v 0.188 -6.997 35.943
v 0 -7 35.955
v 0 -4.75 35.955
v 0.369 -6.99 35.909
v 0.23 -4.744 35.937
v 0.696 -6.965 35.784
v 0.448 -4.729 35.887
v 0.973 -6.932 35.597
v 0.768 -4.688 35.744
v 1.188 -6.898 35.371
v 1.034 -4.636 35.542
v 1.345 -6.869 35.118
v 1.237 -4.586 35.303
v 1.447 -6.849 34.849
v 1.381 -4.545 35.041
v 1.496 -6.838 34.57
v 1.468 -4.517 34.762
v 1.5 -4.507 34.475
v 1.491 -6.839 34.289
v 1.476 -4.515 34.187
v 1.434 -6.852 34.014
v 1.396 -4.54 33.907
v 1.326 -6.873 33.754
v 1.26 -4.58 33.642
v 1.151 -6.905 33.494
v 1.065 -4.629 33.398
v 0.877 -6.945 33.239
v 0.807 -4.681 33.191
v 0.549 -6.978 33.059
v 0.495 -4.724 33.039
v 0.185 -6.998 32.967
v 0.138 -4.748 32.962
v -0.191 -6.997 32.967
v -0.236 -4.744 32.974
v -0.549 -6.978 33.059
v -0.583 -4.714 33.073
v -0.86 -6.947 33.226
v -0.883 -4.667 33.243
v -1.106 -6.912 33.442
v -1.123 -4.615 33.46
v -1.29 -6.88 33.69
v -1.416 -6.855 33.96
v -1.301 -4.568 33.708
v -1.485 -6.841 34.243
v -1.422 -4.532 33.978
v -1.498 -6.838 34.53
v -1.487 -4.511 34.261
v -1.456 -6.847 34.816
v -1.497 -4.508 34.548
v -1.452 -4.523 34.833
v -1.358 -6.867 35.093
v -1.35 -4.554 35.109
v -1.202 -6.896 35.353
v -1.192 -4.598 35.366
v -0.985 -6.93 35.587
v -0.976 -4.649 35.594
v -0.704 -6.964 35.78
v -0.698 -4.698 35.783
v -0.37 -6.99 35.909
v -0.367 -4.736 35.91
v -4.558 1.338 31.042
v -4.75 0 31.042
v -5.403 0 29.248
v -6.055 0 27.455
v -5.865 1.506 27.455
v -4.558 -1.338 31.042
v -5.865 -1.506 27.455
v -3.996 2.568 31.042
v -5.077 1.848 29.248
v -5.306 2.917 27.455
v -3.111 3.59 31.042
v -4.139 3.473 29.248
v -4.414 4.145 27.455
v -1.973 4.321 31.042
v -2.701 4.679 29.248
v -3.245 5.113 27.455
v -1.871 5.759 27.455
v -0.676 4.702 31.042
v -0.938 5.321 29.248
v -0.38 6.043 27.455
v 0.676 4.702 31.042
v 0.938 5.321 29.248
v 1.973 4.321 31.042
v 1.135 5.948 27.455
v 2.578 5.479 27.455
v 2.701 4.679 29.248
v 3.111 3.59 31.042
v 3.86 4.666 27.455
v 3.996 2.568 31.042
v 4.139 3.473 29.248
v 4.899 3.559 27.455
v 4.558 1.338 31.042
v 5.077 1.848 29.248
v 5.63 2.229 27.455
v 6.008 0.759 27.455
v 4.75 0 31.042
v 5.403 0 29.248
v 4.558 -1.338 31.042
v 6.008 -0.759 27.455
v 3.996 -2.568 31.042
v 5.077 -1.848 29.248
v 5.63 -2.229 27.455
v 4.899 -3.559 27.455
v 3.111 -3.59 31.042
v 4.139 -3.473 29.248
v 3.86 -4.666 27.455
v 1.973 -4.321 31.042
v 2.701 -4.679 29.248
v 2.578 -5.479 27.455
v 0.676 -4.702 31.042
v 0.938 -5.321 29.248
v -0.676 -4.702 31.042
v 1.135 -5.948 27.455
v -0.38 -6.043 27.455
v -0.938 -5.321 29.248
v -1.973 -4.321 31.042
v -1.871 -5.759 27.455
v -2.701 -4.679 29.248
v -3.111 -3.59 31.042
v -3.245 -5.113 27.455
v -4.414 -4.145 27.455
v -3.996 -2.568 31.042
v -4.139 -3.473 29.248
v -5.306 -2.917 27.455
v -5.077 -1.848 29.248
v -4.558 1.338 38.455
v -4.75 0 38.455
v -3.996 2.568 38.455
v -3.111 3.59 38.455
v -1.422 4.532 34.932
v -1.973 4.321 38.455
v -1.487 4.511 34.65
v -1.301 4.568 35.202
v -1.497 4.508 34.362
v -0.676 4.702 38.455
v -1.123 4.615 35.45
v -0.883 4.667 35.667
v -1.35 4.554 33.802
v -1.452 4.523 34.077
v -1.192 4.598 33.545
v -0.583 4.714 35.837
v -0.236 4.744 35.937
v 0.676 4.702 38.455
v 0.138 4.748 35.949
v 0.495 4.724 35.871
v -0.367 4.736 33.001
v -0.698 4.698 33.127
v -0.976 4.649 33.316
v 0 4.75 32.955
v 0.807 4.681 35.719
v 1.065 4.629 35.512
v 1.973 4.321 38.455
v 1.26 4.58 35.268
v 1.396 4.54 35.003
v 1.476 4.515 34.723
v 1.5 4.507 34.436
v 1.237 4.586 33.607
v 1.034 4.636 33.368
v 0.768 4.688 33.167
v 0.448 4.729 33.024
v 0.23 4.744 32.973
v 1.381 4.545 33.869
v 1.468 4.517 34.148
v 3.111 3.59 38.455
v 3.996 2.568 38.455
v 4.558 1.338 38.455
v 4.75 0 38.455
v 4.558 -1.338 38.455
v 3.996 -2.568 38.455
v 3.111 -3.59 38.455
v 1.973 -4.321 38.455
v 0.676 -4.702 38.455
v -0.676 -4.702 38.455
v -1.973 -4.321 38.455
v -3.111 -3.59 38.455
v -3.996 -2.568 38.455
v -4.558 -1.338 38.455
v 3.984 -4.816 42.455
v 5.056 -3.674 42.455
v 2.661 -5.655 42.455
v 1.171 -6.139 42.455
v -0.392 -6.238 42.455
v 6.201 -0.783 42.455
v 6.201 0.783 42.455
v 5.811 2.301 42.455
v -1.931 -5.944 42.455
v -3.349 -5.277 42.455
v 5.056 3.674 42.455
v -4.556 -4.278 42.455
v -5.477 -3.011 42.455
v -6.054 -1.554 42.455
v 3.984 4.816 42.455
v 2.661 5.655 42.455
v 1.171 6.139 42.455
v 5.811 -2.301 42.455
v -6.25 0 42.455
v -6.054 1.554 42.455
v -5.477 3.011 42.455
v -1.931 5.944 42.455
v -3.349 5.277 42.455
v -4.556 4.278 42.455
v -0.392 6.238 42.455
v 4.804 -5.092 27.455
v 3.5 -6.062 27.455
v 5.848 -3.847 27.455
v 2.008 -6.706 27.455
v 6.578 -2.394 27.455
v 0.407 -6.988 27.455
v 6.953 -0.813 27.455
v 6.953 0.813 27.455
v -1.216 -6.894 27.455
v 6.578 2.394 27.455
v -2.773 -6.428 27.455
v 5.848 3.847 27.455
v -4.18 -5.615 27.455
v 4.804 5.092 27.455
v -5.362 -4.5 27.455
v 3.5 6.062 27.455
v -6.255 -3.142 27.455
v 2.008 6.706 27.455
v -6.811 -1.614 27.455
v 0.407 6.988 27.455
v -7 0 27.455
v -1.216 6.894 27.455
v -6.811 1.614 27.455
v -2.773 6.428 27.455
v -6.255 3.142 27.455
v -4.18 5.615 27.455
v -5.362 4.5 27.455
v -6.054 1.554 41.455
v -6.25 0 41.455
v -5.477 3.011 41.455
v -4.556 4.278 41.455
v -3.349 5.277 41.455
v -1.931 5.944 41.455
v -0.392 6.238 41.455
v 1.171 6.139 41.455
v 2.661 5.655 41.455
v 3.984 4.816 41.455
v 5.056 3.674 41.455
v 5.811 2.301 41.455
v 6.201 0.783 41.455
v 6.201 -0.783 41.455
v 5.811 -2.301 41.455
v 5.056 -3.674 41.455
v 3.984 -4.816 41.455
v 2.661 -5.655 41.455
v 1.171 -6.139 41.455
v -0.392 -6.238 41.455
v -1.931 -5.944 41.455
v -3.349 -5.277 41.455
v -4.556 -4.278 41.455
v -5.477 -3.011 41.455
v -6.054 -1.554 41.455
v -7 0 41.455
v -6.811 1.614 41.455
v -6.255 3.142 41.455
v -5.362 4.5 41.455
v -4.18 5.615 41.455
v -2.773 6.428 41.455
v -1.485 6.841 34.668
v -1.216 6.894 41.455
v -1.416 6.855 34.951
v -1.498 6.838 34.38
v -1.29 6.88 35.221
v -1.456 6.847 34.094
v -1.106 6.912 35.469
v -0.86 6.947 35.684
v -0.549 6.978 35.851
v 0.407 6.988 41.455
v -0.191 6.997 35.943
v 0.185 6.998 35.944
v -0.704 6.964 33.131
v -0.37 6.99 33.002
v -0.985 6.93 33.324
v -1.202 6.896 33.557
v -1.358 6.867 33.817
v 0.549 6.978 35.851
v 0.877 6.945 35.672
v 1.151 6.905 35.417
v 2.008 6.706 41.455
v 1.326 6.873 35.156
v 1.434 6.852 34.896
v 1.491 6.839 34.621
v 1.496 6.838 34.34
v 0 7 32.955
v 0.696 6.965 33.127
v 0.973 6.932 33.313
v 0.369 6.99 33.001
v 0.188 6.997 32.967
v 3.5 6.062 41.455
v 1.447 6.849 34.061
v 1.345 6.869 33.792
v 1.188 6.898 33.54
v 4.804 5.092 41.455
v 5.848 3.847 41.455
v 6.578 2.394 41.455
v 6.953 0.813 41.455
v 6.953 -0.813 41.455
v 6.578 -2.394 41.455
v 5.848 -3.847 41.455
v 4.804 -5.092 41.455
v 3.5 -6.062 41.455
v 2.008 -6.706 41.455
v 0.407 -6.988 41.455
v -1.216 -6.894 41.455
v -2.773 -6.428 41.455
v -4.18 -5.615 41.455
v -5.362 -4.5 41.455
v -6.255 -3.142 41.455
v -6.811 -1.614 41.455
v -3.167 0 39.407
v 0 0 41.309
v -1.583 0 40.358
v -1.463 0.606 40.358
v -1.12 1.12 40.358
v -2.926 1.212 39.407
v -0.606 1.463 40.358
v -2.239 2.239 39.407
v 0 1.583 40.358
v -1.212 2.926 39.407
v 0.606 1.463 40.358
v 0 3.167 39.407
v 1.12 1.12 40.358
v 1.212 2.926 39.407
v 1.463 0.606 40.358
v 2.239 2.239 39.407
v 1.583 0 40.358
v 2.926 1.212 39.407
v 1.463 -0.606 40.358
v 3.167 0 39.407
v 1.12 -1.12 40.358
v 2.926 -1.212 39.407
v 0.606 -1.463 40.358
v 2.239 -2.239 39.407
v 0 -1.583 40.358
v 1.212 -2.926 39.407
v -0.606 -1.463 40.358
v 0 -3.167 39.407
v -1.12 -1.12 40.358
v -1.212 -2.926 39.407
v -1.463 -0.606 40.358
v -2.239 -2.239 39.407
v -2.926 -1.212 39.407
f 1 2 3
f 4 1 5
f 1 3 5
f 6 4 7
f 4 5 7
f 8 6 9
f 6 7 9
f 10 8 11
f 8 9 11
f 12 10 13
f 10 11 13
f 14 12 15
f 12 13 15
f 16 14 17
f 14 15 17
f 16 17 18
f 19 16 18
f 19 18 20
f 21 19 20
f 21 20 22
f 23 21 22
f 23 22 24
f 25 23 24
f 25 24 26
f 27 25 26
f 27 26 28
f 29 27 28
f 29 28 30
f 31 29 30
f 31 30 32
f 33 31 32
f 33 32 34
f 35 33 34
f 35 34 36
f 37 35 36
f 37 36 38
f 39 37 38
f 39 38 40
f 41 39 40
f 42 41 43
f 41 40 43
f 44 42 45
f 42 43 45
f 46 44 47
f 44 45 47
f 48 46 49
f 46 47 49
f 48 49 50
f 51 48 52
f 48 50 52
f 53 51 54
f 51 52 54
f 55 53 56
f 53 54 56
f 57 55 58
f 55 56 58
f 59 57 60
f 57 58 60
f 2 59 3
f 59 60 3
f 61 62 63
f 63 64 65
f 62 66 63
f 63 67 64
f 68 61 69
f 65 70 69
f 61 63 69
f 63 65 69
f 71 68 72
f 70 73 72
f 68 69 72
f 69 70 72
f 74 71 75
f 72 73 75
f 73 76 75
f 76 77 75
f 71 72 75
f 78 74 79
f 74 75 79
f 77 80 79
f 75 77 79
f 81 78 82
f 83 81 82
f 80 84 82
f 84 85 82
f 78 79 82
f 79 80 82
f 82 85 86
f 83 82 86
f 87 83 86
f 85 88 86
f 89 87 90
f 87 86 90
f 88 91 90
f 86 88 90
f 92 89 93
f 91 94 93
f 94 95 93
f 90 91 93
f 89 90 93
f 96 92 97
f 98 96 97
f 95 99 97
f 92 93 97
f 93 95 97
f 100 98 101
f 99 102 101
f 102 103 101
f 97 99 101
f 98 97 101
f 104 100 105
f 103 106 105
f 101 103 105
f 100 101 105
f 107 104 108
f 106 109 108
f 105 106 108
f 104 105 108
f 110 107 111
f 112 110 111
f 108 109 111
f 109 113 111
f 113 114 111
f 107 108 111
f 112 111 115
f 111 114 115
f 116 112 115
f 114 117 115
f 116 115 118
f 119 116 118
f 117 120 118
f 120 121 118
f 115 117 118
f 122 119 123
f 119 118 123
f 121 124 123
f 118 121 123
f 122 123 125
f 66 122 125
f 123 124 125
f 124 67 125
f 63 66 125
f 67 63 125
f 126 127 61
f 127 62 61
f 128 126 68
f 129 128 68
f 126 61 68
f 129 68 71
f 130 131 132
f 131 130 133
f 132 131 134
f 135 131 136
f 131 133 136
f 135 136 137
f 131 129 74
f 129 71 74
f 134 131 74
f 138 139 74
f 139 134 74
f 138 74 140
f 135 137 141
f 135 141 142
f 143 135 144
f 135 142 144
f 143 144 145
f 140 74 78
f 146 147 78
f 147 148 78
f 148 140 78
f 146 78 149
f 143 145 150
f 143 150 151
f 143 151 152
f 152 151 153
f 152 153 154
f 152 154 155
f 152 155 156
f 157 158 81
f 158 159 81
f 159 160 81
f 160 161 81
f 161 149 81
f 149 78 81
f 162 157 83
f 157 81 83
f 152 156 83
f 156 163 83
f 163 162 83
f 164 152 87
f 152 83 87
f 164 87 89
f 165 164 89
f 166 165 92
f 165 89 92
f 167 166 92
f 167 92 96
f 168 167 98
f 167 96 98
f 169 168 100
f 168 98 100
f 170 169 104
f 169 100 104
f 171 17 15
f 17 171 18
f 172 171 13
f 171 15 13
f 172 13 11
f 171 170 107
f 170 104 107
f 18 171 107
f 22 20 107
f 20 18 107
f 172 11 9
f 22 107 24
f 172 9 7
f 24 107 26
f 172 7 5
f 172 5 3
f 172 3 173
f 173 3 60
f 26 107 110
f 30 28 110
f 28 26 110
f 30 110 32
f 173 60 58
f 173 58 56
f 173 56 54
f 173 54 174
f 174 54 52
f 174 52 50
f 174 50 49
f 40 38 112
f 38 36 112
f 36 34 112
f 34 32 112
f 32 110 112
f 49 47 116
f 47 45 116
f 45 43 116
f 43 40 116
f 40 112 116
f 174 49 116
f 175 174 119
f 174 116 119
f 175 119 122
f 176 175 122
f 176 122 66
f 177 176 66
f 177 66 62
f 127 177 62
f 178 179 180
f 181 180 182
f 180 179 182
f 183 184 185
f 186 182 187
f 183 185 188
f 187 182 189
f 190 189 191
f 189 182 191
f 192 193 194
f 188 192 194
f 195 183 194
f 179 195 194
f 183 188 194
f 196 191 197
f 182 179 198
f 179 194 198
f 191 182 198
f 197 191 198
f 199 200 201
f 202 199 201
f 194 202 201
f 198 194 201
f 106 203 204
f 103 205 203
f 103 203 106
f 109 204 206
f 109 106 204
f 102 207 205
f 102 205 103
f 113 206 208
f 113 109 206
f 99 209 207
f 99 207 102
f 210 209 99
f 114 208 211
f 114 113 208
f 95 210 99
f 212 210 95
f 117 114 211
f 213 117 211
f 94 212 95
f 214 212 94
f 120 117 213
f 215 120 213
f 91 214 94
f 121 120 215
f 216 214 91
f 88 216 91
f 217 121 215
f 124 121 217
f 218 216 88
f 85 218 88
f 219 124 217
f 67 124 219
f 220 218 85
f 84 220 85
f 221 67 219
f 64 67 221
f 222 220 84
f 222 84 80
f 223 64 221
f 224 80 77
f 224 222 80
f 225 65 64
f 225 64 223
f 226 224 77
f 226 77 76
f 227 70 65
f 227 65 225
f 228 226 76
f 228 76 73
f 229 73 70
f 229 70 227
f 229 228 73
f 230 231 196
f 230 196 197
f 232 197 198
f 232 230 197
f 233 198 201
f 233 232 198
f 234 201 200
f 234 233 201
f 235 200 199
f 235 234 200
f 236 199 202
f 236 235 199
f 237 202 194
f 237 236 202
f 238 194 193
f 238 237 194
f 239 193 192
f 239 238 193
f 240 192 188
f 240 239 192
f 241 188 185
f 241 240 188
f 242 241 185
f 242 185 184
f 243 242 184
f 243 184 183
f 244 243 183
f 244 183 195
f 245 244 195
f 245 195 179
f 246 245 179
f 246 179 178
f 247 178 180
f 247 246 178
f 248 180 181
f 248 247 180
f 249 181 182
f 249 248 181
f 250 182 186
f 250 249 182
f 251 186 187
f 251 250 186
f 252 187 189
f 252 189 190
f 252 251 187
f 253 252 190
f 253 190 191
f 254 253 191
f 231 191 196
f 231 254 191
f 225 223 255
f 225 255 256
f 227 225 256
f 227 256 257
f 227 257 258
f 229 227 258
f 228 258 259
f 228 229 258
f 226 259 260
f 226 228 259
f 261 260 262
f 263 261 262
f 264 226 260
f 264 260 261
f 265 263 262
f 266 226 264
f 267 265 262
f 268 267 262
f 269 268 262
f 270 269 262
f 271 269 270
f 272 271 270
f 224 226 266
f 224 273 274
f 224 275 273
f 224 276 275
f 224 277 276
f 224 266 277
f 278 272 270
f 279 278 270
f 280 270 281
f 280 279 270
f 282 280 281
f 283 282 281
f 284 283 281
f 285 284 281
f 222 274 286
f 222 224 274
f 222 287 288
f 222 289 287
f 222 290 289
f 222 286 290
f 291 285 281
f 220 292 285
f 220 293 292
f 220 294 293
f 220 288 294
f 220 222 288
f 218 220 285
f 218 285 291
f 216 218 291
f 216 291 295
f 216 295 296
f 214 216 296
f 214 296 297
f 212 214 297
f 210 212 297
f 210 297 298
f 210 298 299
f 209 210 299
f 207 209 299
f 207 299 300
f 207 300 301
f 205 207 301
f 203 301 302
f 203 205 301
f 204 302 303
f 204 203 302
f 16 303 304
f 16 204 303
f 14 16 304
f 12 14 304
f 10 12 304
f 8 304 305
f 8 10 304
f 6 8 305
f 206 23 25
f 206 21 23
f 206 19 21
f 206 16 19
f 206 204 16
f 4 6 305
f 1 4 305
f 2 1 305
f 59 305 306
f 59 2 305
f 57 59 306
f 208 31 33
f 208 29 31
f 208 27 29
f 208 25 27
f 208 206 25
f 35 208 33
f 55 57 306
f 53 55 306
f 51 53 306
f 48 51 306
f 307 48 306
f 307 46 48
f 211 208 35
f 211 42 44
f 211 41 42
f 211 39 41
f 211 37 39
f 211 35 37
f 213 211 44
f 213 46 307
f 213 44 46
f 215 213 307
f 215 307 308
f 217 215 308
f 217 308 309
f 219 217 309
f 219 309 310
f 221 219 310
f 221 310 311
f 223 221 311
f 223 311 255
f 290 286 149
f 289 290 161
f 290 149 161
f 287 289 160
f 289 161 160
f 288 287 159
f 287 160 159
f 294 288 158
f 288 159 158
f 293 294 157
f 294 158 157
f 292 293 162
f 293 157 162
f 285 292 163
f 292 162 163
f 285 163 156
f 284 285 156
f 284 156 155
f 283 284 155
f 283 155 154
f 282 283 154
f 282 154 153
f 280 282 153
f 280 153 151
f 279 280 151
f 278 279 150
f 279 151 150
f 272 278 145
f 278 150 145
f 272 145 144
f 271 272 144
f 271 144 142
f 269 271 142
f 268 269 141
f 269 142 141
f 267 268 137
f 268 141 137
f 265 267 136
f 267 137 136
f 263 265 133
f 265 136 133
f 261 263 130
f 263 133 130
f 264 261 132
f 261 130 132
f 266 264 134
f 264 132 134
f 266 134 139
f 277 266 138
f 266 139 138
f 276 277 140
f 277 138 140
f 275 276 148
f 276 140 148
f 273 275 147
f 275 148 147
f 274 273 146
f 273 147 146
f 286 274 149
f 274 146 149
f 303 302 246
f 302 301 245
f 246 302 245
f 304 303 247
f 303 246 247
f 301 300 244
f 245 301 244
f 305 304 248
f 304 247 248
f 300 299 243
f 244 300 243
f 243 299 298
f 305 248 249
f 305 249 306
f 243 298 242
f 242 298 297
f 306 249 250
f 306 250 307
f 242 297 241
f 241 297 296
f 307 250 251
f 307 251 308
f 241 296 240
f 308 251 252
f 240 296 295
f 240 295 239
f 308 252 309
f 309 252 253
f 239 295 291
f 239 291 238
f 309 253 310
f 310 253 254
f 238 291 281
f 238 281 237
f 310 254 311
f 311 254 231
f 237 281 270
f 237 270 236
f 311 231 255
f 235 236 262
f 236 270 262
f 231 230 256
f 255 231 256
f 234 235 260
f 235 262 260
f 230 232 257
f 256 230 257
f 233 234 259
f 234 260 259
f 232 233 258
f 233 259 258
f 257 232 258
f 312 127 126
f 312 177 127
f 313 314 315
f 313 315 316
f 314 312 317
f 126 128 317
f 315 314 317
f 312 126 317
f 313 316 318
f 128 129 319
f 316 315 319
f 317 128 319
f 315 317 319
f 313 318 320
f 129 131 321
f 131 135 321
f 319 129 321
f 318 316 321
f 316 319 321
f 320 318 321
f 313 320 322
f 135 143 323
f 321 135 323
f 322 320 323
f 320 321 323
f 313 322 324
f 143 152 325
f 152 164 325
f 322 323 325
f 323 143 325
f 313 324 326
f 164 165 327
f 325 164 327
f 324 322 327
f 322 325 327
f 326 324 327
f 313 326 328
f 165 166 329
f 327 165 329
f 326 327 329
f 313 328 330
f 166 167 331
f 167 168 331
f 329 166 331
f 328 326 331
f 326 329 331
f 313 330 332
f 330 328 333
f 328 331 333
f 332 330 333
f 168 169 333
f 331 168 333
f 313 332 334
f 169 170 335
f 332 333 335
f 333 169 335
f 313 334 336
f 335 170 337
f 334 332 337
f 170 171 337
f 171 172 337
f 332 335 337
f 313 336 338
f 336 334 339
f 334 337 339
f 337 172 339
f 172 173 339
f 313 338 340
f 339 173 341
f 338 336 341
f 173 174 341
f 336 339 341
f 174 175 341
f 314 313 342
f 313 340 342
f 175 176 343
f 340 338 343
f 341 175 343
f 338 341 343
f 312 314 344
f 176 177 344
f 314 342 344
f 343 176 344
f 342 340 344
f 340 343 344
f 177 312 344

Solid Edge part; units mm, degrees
sketch "Sketch1" plane through (0, 0, 0) normal (0, -1, 0) x (1, 0, 0)
  line L0 (-4.75, 38.4552) -> (-4.75, 31.0416)
  line L1 (-4.75, 31.0416) -> (-6.0553, 27.4552)
  line L2 (-7, 27.4552) -> (-6.0553, 27.4552)
  line L3 (-7, 41.4552) -> (-7, 27.4552)
  line L4 (-6.25, 41.4552) -> (-7, 41.4552)
  line L5 (-6.25, 42.4552) -> (-6.25, 41.4552)
  line L6 (0, 42.4552) -> (-6.25, 42.4552)
  line L7 (0, 42.4552) -> (0, 41.3093)
  line L8 (0, 41.3093) -> (-4.75, 38.4552)
revolve "RevolvedProtrusion1" add sketch "Sketch1" angle 360 about axis through (0, 0, 42.4552) along (0, 0, -1)
hole "Hole1" at (0, 0, 34.4552) direction (0, -1, 0) diameter 3 end through all both ways yes
